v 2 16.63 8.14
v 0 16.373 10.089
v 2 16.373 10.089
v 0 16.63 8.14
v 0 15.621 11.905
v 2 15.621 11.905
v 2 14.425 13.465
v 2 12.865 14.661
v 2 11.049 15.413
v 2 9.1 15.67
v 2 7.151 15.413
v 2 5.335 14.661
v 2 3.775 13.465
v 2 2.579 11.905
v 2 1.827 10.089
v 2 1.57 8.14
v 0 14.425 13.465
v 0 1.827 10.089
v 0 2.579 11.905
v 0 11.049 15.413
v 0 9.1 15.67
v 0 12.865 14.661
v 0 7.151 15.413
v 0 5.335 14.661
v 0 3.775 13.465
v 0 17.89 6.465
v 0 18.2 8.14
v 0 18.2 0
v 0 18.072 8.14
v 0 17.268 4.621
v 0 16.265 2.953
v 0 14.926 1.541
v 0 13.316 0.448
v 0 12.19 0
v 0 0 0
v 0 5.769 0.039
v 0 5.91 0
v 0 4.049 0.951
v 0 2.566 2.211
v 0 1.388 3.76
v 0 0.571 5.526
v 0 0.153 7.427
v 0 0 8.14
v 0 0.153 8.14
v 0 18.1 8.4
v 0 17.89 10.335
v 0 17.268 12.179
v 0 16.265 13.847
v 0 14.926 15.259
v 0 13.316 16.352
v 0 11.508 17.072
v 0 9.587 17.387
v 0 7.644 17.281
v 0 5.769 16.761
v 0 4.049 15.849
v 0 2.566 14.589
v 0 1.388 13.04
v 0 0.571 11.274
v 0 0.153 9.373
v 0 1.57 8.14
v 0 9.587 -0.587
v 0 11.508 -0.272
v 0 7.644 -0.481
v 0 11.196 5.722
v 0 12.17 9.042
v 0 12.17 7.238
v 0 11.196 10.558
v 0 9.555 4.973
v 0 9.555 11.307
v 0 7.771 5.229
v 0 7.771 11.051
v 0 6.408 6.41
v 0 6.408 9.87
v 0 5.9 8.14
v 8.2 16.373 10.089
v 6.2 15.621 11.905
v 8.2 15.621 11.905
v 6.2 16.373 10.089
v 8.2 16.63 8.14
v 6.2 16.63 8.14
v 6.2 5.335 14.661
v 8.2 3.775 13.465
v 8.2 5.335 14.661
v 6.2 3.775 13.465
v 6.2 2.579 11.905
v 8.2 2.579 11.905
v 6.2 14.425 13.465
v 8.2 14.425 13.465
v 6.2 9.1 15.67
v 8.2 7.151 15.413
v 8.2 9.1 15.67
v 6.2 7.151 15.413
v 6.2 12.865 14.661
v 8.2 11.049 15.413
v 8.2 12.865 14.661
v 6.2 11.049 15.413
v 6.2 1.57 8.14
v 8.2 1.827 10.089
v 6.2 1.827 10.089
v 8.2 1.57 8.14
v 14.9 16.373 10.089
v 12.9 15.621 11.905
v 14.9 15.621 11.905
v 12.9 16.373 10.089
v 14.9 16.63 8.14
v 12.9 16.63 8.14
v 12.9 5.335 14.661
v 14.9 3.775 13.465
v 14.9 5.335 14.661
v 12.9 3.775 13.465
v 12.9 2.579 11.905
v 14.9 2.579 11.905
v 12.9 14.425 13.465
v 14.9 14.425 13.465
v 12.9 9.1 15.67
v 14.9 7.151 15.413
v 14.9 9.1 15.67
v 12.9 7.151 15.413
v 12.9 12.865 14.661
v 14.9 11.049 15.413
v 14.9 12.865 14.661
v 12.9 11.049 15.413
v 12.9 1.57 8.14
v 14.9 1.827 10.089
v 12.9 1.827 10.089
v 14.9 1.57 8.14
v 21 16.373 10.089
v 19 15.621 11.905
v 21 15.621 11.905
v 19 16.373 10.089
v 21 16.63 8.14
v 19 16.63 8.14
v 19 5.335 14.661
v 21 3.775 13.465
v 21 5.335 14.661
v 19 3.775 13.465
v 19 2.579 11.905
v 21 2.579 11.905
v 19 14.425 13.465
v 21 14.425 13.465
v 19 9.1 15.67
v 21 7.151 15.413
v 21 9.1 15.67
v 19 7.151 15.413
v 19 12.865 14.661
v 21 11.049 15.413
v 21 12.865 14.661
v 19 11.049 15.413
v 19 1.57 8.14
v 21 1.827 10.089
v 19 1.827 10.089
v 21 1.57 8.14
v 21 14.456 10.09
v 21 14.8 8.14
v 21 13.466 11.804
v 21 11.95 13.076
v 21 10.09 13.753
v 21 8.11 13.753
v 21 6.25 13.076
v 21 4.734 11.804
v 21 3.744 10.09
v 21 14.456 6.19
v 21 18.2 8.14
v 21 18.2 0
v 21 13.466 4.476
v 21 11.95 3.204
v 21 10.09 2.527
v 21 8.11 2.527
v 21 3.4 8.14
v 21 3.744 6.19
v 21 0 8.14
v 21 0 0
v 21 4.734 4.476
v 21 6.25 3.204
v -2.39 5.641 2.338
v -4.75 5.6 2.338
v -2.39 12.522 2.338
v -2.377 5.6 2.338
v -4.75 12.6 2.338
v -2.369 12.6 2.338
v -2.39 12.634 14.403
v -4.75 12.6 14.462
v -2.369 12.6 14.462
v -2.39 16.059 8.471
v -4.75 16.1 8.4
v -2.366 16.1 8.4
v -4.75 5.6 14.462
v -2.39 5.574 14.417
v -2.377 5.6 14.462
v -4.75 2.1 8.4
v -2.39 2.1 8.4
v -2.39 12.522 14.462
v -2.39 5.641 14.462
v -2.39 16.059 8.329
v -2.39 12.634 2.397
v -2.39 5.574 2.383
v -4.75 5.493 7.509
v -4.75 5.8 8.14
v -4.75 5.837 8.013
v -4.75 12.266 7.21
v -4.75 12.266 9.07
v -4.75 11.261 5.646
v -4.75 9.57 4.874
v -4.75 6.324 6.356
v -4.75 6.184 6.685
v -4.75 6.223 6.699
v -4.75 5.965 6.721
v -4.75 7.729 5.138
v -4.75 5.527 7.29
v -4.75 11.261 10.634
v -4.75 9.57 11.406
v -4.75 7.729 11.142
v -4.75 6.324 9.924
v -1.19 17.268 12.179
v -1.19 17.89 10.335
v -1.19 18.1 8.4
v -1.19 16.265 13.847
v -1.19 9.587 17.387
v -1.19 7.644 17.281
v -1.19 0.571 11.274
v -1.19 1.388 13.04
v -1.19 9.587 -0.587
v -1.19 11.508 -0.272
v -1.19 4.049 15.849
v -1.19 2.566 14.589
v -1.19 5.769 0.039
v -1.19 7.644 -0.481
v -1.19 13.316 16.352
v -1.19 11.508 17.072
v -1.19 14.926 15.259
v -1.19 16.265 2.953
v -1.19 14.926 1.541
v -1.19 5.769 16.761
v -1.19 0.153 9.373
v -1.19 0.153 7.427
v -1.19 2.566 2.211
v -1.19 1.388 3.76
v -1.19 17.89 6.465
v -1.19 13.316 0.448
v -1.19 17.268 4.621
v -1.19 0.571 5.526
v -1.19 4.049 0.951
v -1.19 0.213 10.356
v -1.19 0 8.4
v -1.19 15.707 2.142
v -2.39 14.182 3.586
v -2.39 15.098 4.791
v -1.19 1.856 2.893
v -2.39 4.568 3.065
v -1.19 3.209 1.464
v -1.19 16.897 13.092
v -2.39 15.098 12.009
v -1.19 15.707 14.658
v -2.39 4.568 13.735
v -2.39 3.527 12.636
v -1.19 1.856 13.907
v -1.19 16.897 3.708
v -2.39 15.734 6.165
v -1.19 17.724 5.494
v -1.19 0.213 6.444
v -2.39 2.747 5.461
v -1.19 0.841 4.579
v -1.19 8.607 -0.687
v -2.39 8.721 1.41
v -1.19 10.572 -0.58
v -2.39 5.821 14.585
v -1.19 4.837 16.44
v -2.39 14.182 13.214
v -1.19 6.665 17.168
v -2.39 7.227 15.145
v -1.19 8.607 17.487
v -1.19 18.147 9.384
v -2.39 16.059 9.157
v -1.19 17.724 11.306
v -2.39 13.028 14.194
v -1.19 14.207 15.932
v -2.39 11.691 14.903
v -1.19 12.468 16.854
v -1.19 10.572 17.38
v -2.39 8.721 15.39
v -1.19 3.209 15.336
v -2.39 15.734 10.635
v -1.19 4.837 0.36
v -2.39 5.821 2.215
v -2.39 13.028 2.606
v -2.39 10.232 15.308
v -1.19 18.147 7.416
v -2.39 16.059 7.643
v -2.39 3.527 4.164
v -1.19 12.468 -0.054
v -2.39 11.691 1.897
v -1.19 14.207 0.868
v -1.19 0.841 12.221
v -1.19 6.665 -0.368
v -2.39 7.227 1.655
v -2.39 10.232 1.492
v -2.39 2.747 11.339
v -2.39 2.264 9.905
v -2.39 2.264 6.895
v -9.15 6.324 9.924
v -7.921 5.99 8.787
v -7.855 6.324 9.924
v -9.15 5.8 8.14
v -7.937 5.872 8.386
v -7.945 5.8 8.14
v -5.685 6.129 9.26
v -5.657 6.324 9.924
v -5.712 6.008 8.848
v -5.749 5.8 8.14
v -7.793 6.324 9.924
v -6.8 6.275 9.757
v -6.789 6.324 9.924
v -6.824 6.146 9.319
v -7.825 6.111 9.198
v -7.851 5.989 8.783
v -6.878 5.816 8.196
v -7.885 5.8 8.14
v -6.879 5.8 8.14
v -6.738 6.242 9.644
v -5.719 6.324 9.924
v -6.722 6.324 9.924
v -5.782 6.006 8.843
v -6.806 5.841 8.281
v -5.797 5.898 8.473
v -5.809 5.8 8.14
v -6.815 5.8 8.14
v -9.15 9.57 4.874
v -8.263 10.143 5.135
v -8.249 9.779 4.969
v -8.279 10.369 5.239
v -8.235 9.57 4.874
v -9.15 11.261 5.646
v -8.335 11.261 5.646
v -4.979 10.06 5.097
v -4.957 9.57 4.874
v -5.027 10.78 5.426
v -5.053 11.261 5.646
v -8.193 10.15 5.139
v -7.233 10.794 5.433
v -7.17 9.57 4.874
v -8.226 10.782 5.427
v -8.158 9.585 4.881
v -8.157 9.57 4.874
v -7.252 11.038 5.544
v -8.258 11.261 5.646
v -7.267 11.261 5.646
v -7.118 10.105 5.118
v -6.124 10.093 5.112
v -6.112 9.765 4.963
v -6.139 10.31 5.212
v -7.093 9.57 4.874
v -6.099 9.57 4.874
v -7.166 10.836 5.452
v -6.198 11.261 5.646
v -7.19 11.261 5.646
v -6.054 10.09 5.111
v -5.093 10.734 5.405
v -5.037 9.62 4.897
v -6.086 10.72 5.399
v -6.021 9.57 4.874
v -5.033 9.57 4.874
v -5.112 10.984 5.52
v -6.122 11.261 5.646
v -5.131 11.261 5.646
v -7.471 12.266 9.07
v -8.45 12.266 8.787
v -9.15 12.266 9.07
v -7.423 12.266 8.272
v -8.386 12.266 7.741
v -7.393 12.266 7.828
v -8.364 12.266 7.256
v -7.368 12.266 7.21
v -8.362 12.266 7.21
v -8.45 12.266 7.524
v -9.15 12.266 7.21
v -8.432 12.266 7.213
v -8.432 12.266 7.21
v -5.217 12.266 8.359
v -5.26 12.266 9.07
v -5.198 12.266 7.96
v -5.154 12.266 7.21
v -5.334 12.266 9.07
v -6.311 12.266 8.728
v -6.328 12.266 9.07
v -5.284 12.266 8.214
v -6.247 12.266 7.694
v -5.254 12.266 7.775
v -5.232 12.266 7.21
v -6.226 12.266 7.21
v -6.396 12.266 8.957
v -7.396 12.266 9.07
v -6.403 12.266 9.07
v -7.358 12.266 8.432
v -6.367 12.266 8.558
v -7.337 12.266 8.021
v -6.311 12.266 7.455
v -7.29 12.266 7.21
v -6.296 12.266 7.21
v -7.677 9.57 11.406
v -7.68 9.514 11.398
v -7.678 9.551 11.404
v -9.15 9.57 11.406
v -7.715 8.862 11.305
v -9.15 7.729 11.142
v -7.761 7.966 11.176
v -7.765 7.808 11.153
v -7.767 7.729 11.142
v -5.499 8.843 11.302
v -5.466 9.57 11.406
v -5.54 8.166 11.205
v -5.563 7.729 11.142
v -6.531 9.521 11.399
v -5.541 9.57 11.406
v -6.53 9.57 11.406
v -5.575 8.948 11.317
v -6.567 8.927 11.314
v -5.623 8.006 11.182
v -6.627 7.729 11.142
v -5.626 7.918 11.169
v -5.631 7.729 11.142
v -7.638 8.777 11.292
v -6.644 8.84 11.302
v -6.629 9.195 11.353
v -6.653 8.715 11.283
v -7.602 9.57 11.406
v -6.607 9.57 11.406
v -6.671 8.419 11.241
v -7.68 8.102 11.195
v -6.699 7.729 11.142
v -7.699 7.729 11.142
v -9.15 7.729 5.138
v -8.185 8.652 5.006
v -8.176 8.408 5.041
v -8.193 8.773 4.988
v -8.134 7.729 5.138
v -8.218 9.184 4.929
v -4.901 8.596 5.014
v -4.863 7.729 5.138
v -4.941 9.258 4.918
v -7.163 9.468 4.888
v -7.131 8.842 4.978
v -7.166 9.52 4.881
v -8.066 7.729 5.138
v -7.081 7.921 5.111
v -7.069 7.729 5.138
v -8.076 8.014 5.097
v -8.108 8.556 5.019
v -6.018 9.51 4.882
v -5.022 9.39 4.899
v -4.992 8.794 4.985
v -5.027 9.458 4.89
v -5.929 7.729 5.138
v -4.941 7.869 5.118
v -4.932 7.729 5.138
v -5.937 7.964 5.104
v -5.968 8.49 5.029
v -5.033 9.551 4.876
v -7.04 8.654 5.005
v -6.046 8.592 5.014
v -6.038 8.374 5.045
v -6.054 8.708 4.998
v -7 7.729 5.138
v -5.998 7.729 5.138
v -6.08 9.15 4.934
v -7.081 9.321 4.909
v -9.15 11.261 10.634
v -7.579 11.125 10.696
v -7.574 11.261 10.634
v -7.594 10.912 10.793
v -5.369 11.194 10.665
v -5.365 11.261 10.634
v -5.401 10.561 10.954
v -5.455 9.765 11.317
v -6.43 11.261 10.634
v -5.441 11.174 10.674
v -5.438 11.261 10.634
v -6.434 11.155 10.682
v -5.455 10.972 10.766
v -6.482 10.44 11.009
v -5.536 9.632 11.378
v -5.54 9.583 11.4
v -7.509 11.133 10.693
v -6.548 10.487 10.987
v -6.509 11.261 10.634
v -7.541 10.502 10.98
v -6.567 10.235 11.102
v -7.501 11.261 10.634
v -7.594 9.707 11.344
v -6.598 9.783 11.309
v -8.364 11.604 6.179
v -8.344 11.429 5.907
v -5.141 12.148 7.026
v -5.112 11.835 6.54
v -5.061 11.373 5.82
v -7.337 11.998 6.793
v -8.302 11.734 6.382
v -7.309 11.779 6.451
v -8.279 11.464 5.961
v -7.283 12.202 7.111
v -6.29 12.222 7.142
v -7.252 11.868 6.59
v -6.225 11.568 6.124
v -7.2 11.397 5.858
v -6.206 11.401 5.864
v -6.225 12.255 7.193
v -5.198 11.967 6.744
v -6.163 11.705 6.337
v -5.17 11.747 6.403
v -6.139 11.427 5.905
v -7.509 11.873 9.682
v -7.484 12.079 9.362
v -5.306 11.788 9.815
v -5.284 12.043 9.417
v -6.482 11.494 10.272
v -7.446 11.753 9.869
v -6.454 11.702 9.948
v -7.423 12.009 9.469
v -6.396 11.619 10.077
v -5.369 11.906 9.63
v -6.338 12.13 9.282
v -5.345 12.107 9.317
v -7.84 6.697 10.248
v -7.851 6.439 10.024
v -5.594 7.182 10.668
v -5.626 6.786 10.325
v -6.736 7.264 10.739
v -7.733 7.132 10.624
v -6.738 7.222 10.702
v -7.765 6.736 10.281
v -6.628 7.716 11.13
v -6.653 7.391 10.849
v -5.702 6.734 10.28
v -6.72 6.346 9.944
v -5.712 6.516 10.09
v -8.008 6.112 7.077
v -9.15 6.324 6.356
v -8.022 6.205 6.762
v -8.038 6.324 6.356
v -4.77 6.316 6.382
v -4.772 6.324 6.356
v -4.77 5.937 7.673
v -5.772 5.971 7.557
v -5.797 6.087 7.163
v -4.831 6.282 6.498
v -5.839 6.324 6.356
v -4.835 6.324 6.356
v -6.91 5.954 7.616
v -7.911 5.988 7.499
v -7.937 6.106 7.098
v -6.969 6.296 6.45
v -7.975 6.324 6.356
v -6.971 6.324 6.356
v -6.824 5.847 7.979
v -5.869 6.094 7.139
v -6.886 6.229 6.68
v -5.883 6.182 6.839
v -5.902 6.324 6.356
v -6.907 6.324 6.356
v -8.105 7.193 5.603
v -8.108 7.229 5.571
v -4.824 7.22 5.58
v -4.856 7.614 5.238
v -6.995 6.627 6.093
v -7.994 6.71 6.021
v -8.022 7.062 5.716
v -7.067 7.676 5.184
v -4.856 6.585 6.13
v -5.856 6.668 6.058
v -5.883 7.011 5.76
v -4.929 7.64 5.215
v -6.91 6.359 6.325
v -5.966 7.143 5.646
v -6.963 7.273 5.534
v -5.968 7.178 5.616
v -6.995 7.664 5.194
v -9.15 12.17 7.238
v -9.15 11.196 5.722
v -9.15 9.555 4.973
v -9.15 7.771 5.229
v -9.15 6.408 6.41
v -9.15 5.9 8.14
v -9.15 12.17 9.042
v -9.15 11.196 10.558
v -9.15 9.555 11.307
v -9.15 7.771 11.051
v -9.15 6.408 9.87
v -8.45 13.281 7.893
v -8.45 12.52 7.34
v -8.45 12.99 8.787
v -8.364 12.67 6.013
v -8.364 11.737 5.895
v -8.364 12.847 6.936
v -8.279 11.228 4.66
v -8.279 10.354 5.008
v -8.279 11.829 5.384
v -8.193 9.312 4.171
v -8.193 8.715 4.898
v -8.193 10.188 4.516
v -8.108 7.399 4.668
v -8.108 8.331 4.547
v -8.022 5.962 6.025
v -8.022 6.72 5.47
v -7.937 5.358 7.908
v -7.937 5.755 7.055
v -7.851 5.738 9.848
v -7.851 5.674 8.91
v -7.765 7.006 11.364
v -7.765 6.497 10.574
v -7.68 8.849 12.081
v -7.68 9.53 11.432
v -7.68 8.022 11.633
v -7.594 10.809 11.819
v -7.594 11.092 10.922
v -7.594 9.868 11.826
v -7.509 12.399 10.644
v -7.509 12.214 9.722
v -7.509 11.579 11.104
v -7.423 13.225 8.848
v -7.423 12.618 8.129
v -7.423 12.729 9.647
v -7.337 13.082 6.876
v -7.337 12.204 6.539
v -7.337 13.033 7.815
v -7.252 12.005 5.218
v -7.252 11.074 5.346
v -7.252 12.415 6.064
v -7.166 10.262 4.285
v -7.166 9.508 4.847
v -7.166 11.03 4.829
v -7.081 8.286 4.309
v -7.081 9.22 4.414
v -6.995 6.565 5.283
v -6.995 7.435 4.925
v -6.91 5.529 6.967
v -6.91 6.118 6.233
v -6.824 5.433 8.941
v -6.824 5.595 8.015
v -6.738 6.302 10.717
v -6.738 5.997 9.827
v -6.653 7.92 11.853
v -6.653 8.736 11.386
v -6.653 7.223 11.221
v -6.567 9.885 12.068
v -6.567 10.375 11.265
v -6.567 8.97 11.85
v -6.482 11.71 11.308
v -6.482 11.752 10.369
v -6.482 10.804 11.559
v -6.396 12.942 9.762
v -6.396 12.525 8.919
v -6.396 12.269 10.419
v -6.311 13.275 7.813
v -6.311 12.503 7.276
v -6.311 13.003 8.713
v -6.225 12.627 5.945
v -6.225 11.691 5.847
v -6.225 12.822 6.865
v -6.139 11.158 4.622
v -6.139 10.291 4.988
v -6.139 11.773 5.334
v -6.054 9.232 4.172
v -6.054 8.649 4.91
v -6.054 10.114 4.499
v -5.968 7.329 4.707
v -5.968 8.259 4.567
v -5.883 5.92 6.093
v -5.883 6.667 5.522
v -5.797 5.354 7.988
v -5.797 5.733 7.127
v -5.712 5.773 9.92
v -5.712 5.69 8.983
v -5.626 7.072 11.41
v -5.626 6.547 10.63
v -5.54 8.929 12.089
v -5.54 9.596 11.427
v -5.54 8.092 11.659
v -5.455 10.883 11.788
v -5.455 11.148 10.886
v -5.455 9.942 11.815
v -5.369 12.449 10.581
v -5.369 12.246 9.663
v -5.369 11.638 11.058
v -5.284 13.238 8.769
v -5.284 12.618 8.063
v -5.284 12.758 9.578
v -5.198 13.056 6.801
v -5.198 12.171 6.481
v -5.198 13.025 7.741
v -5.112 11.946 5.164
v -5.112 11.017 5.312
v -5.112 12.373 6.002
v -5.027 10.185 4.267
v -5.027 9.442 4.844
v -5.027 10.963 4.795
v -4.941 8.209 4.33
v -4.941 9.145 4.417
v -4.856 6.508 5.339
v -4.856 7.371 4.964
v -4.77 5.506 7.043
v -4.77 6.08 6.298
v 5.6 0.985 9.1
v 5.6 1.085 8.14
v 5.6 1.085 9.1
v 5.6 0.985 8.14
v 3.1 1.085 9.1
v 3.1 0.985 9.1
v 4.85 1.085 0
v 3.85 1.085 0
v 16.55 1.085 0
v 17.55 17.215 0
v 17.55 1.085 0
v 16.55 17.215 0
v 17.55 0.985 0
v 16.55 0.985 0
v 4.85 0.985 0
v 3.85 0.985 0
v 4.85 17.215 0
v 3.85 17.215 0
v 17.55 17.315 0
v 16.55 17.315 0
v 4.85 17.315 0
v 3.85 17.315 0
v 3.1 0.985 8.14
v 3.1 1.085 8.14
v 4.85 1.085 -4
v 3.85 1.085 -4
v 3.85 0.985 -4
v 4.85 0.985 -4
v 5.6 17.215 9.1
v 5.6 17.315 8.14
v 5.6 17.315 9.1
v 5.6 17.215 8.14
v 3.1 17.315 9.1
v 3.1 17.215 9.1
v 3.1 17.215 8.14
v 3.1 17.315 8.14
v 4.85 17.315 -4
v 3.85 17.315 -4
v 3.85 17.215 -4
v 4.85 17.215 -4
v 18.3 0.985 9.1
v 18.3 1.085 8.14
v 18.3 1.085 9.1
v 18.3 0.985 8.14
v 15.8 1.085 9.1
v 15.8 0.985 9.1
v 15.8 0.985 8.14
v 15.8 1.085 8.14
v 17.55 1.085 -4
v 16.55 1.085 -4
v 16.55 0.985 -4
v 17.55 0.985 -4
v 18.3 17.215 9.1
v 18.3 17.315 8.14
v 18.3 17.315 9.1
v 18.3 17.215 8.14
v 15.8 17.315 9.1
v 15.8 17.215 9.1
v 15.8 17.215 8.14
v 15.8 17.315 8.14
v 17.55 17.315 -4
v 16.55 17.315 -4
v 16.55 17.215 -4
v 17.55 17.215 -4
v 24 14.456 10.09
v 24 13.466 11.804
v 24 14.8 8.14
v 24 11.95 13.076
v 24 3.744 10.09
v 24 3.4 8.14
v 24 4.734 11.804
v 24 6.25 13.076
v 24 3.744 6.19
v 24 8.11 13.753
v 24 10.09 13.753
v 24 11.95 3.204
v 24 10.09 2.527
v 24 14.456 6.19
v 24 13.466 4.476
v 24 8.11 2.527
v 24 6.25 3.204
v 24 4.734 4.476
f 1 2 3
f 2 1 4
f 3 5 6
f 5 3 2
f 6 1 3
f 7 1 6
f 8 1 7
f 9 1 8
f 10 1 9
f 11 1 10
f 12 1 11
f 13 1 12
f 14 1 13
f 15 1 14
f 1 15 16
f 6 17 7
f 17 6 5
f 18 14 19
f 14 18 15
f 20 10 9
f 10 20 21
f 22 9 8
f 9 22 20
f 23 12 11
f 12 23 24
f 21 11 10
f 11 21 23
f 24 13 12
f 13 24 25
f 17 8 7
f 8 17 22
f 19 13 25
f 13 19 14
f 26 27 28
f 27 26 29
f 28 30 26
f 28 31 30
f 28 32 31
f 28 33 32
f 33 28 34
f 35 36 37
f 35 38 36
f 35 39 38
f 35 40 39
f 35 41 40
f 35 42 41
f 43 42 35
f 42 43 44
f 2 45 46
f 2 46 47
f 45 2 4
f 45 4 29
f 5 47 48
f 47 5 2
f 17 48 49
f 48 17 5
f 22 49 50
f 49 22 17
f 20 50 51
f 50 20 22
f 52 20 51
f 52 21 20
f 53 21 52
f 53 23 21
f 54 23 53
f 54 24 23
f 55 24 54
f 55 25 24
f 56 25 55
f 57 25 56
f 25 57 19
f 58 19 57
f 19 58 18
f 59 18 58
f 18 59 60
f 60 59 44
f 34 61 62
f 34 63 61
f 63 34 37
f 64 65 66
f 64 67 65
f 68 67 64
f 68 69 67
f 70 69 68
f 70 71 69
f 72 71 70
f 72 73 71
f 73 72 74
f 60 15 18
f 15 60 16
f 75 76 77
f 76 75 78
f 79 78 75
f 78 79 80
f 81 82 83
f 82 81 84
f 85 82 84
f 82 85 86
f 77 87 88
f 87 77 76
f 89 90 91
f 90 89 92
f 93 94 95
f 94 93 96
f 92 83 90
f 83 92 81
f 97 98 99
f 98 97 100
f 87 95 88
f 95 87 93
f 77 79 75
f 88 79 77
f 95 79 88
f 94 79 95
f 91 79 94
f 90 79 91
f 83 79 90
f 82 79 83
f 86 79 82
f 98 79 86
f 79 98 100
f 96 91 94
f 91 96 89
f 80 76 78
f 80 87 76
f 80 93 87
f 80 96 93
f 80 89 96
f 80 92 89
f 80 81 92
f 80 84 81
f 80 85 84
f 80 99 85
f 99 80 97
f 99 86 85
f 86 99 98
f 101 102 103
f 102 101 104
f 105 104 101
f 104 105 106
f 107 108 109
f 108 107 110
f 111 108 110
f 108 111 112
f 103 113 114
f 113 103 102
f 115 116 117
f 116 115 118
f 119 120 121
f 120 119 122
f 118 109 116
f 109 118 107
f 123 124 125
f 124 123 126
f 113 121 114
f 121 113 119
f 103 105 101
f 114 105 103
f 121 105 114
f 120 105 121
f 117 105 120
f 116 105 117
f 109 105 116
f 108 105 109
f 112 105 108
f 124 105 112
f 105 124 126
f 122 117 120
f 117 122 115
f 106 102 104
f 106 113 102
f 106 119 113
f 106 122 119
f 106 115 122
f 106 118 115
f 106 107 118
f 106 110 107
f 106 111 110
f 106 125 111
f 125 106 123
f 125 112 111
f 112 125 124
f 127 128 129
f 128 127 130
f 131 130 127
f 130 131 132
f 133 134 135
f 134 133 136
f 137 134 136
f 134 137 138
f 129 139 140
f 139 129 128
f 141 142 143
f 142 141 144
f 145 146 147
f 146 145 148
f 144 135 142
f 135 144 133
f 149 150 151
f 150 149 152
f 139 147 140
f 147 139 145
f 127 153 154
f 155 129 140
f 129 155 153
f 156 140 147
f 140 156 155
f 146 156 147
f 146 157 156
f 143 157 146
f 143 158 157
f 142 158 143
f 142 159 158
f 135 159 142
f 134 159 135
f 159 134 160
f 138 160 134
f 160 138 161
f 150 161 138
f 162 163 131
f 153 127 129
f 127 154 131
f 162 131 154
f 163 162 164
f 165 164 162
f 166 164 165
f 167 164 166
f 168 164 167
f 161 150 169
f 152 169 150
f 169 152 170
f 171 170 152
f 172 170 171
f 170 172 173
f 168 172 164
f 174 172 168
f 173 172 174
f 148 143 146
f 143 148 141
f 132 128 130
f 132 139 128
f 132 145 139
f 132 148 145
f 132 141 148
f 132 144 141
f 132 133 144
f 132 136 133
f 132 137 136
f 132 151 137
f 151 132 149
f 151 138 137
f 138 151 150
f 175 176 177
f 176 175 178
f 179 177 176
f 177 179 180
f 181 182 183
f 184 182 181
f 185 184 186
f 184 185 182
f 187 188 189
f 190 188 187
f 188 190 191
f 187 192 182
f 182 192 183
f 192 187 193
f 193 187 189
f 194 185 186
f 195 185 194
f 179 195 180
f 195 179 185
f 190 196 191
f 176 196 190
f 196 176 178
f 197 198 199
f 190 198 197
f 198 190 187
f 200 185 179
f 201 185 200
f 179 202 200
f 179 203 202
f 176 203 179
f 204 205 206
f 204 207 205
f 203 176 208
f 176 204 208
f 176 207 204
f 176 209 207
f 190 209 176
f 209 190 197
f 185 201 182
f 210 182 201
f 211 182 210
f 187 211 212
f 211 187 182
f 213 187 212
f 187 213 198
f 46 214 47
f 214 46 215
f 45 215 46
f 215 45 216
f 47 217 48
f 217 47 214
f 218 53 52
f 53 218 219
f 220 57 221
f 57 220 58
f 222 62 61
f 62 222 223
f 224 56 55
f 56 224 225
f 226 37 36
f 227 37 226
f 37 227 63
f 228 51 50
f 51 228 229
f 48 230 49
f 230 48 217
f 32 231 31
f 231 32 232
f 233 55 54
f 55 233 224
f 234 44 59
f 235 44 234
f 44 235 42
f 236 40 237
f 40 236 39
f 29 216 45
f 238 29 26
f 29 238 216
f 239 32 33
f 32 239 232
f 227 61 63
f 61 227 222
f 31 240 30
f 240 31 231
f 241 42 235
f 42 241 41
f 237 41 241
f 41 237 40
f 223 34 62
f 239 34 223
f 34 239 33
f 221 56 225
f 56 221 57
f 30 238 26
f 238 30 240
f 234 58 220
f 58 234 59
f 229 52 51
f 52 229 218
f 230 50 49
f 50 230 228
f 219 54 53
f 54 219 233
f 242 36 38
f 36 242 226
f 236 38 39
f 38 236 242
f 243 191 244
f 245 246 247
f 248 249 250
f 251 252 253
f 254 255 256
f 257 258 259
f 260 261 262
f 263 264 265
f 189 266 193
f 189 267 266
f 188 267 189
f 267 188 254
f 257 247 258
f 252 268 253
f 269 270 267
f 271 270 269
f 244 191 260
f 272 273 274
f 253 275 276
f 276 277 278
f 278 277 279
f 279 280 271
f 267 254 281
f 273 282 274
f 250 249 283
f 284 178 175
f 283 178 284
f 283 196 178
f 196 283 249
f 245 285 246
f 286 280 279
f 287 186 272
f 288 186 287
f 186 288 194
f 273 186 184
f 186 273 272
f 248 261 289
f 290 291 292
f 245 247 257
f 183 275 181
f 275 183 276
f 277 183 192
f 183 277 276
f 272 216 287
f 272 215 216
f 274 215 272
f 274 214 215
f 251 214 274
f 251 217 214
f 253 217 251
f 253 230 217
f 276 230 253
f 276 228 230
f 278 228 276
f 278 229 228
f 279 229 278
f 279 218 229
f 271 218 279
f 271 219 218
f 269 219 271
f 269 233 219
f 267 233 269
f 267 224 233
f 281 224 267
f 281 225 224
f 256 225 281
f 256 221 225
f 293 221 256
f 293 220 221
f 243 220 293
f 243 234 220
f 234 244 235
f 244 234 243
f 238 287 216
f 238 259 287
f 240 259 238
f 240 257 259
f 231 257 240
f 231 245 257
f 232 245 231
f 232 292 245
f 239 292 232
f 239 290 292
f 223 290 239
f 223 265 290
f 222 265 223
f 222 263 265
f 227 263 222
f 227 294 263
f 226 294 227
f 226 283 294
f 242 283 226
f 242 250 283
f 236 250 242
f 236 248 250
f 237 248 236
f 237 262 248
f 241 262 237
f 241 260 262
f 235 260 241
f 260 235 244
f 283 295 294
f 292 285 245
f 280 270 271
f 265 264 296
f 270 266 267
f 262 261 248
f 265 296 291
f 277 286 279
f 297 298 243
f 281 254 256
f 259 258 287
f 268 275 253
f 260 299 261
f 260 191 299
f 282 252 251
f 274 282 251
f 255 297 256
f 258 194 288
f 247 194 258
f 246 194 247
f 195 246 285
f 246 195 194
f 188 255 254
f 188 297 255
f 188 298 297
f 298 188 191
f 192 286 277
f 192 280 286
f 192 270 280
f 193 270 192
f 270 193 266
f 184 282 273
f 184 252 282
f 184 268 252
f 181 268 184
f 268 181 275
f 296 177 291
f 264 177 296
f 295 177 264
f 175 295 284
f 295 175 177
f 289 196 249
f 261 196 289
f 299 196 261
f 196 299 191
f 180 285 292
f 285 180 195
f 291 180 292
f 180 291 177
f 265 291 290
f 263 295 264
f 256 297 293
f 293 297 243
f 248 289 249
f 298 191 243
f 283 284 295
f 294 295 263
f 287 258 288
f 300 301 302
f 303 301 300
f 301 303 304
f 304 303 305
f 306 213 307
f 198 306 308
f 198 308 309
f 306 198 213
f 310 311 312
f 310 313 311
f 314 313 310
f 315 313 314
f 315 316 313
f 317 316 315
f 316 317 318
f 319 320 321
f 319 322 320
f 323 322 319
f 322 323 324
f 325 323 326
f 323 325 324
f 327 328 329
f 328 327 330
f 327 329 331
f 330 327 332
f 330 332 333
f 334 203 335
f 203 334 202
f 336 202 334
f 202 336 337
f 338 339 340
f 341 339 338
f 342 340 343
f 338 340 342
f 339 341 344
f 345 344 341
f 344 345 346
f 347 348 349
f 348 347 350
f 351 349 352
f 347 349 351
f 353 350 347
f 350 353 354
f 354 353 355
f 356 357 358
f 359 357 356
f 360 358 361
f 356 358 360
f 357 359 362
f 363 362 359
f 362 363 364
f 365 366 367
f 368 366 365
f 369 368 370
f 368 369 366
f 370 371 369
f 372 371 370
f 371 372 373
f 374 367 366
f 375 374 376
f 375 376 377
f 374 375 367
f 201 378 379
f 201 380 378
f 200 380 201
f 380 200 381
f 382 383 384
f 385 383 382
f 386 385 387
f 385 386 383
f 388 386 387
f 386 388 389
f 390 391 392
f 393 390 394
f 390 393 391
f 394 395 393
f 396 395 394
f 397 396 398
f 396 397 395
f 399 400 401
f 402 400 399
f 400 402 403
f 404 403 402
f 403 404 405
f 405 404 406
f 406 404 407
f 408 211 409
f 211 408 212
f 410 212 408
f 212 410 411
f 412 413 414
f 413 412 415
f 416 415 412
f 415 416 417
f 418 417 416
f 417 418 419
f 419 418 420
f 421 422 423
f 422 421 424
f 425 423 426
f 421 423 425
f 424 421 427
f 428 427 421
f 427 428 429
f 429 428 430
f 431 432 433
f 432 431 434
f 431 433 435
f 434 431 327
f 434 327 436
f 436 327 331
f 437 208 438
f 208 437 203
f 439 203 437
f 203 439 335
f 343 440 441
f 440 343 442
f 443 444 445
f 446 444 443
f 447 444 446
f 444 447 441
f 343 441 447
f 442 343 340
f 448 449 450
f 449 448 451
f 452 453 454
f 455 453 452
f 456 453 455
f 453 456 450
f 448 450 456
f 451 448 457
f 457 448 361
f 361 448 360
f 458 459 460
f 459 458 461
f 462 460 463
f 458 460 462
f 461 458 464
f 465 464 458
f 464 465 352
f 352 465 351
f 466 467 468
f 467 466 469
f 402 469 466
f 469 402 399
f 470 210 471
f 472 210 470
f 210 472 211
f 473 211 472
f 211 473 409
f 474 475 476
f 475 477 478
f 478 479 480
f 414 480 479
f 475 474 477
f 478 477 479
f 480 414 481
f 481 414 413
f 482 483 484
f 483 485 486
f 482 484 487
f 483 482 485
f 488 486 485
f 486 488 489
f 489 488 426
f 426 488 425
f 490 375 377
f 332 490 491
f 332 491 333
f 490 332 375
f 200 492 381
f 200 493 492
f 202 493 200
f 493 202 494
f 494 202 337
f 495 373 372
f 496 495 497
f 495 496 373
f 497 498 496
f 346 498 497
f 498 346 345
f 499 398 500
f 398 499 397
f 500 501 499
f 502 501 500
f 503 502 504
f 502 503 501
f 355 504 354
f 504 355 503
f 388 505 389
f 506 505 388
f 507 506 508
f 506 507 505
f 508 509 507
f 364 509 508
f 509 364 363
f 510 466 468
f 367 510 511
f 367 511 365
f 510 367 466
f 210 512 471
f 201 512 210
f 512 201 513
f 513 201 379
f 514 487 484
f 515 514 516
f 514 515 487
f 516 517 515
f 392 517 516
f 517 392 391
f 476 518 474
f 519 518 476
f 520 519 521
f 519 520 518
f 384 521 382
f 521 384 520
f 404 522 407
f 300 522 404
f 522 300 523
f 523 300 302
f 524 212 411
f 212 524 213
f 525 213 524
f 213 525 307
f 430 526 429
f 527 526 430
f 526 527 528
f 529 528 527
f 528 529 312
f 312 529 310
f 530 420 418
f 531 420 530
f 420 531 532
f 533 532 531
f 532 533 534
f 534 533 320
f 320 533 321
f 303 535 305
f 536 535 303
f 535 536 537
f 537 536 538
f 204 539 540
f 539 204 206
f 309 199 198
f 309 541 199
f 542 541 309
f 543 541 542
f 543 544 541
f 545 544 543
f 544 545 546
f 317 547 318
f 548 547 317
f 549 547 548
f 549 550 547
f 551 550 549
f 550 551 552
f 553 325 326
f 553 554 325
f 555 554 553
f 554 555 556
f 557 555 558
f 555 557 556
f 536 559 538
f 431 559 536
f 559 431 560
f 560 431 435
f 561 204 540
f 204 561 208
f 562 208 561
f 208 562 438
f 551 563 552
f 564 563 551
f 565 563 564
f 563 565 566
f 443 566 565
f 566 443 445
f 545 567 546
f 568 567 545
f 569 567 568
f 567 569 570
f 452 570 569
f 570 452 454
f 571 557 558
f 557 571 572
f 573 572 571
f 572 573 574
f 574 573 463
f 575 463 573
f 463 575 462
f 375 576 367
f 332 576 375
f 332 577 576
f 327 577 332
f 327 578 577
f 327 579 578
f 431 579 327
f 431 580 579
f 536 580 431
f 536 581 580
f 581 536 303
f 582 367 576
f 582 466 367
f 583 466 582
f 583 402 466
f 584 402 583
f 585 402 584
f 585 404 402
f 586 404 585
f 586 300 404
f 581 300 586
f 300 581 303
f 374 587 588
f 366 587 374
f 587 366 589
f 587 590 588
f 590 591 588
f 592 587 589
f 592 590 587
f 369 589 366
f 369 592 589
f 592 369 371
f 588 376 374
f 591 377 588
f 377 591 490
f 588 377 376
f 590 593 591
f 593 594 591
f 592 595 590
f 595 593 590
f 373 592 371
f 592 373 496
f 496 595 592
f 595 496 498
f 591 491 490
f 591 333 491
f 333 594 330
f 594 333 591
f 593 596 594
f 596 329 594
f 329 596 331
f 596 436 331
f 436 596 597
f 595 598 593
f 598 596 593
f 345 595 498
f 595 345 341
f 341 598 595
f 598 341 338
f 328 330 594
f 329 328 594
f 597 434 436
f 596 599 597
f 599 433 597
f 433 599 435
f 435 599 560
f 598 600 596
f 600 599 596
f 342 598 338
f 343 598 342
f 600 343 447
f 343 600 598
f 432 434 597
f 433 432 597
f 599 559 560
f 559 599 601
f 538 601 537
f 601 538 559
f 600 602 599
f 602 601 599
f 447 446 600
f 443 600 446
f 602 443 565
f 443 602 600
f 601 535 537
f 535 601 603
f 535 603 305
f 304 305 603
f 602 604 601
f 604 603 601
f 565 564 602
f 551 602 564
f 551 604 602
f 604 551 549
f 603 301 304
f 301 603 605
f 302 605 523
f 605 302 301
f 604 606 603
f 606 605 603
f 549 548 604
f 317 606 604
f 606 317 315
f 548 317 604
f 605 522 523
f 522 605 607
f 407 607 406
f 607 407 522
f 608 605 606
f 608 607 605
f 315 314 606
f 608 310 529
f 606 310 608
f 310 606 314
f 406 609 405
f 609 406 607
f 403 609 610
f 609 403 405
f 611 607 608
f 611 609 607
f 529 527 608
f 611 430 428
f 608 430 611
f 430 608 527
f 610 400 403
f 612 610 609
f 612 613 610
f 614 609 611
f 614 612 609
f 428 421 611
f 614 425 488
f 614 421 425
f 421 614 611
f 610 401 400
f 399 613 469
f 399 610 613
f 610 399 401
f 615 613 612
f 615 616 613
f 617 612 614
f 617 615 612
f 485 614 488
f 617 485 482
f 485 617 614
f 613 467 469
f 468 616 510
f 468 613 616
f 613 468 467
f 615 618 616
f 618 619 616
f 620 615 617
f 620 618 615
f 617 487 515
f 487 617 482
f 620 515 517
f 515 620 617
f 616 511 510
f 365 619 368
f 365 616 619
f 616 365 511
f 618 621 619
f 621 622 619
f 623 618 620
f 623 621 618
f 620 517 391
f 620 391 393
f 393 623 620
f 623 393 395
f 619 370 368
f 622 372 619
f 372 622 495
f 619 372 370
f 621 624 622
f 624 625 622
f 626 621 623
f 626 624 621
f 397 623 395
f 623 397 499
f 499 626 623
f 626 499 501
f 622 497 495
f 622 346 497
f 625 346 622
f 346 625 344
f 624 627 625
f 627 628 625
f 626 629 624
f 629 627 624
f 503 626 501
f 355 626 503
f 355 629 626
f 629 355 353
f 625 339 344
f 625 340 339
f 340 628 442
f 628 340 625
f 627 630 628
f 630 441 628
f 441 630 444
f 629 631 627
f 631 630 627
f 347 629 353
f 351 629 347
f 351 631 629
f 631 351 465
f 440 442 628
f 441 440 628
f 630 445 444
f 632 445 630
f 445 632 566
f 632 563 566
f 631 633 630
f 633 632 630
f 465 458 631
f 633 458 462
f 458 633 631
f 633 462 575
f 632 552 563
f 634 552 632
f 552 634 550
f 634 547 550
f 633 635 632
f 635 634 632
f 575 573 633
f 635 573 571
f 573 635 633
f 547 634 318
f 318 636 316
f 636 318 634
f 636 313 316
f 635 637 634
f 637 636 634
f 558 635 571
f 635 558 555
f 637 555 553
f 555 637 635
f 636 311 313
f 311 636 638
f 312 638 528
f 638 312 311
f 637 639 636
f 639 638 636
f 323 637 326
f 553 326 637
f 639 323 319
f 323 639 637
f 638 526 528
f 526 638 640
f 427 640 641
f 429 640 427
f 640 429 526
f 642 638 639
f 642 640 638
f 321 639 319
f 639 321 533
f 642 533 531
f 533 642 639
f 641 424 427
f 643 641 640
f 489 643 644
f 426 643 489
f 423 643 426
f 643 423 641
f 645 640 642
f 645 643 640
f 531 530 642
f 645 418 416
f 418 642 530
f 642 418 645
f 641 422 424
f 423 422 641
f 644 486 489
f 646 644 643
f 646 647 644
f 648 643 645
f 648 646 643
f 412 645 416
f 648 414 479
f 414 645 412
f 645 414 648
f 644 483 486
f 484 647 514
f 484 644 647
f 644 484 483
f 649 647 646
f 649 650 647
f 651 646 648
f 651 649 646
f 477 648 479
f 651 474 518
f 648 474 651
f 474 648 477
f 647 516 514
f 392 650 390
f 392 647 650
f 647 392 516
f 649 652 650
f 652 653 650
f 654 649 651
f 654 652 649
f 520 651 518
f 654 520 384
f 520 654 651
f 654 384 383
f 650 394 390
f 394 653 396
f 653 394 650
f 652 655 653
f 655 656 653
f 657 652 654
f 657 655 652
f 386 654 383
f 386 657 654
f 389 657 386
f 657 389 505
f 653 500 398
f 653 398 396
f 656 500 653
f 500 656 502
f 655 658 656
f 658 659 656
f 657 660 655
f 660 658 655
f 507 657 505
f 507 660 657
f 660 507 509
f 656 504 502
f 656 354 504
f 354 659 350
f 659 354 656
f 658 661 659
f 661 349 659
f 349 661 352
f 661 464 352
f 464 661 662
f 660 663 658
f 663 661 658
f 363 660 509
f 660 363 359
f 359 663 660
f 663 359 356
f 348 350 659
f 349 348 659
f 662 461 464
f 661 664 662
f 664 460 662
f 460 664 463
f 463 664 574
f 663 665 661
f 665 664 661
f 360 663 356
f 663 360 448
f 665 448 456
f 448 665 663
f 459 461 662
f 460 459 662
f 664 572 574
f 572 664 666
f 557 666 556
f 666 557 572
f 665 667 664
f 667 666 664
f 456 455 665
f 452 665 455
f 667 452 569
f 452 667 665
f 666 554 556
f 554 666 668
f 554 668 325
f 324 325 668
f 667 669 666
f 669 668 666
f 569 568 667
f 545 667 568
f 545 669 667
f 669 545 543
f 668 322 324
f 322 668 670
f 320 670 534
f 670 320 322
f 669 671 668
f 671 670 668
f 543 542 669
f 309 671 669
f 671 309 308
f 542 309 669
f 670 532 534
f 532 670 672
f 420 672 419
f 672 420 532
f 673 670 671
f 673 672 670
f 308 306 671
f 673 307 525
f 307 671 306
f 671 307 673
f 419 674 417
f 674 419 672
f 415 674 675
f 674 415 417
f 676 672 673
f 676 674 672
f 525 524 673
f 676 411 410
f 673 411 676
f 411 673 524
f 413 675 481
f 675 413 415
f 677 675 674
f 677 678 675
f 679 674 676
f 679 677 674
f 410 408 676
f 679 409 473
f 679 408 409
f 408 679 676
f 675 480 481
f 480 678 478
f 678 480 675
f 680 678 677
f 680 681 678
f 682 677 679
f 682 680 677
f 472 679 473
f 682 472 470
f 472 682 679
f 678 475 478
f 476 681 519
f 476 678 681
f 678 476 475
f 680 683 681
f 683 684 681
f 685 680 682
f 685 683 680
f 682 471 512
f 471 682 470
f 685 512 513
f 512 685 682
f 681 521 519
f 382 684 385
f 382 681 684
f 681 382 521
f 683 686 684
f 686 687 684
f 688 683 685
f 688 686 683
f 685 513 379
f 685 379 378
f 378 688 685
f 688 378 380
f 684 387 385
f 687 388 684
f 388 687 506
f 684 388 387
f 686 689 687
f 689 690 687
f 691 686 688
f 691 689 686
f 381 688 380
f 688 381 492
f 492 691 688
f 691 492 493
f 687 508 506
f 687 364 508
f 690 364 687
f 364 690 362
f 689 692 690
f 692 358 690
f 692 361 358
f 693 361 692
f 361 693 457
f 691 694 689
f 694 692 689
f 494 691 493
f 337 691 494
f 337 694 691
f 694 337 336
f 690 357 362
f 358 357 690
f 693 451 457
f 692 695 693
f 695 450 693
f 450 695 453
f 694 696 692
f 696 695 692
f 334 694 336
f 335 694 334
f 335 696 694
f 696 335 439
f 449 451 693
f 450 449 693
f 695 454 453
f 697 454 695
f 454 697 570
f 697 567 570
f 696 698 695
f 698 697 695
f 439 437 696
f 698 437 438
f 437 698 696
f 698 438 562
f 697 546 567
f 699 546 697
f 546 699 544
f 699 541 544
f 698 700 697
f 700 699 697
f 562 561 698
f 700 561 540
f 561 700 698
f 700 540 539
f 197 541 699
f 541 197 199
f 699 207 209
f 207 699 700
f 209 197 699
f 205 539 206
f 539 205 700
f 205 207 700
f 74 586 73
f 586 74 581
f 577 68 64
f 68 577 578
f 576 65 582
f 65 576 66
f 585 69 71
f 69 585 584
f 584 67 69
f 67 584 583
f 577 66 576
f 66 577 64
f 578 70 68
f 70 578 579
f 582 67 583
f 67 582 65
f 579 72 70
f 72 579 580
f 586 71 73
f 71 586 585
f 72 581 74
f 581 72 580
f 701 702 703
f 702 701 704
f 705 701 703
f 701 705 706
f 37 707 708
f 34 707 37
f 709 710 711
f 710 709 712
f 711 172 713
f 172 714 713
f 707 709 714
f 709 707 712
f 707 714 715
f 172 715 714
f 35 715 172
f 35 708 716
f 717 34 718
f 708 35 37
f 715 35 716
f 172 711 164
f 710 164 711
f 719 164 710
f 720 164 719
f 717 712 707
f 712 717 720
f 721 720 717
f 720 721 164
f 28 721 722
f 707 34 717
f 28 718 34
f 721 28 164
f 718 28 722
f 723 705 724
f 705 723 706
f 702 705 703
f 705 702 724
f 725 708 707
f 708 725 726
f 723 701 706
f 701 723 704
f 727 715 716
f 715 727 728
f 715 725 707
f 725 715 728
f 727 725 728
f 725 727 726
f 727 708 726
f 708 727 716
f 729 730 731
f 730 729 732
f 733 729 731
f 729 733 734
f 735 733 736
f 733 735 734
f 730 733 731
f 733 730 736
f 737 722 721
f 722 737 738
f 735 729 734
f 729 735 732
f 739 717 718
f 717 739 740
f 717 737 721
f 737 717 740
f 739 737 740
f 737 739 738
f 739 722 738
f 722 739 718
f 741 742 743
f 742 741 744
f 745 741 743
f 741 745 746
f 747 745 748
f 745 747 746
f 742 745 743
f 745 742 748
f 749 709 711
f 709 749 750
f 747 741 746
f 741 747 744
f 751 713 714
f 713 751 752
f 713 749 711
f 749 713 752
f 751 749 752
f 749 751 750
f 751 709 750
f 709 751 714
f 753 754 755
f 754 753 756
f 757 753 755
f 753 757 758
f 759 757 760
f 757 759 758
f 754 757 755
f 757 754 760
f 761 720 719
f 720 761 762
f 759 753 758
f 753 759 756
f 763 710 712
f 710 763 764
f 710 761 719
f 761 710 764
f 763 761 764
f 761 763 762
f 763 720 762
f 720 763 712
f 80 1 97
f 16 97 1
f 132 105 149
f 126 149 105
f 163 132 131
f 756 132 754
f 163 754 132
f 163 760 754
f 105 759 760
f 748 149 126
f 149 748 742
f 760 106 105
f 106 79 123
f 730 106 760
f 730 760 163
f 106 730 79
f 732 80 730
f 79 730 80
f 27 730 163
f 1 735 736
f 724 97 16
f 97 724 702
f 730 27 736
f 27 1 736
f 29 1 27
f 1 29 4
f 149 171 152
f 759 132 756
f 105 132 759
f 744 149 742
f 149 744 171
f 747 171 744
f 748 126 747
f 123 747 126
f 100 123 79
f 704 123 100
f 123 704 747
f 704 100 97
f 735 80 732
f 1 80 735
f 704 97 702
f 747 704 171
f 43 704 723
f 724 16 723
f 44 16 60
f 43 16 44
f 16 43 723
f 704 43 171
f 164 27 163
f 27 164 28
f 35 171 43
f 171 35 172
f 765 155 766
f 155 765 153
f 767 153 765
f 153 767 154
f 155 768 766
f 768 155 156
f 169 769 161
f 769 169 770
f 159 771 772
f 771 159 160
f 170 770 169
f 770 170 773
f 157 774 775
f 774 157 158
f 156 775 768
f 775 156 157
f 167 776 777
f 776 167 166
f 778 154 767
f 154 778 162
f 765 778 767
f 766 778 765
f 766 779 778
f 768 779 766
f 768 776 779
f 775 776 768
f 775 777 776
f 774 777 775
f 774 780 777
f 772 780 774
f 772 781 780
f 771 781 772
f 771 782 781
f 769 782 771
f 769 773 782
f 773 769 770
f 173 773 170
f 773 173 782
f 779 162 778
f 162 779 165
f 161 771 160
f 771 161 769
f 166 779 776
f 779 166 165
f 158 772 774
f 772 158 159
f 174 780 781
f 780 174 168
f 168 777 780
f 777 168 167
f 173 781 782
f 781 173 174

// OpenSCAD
/* 2014 Don Bosley : 
Neutrik Jack Set V 0.0
For updates/corrections email : don@bosleymusic.com
Mechanical Drawing

Compatible with Neutrik products : 
- mono jack, switched, full threaded nose and straight PCB pins

NMJ4HFD2

*/

//MAIN BODY
translate([0,0,0])
color("black") 
cube([21,18.2,8.14]); 

//FRONT 
//BODY SECTIONS
for (i = [ [0,9.1,8.14],
		   [6.2,9.1,8.14],
		   [12.9,9.1,8.14],
		   [19,9.1,8.14],
])
{
	color("black")
	translate(i)
	rotate([90,0,90])
	cylinder(r=15.67-8.14, h=2); 
}

//REAR CYLINDER
color("black")
translate([20.9,9.1,8.14])
rotate([90,0,90]) 
cylinder(r=5.7,h=3.1);


difference(){
	union(){
		//NUT
		color("lightgrey")
		translate([.25, 9.1,8.4])
		rotate([90,0,-90])
		cylinder(r=7,h=5, $fn=6); 
		
//FRONT WASHER
			color("black")
			translate([-1.2,9.1,8.4])
			rotate([90,0,90])
			cylinder(r=9, h=1.2); 

//FRONT BEVEL / NUT
		color("black")
		translate([-1.19, 9.1,8.4])
		rotate([90,0,-90])
		cylinder(r2=7, r1=9.1,h=1.2);
//MAIN SHAFT 
		color("black")
		translate([-.15, 9.1,8.14])
		rotate([90,0,-90])
		cylinder(r=3.3,h=9); 
//FRONT SCREW THREAD
		color("black")
		translate([-4, 15.75-6.43, 8.14])
		rotate([0,90,0])
		linear_extrude(height = 8.9, center = true, convexity = 10, twist = 3000)
		translate([0, 3.2, 1])
		circle(r = .8); 
	}
//NUTHOLE
color("black")
translate([8, 9.1,8.14])
rotate([90,0,-90])	
cylinder(r=3.2,h=24); 
}


/*ENSURE PIN CENTERS ARE ALIGNED (COMMENT OUT)
for (i = [  [4,2.23/2,-2],//S
		   [4,18.2-2.23/2,-2],//SN
		   [16.7,2.23/2,-2],//T
		   [16.7,18.2-2.23/2,-2],//TN

 ])
{
	translate(i)
	color("blue")
	cylinder(r=.7, h=9);
}
*/

//PINS 
for(i = [
	     [4.35-1.25,.985,0],//S
		 [4.35-1.25,18.2-.985,0],//SN
	     [17.05-1.25,.985,0],//T
		 [17.05-1.25,18.2-.985,0],//TN

])
{
	translate(i)
	color("lightgrey") 
	union(){
			cube([2.5,.1,9.1]);  
			translate([.75,0,-4])
			cube([1,.1,4]);
	}
}
